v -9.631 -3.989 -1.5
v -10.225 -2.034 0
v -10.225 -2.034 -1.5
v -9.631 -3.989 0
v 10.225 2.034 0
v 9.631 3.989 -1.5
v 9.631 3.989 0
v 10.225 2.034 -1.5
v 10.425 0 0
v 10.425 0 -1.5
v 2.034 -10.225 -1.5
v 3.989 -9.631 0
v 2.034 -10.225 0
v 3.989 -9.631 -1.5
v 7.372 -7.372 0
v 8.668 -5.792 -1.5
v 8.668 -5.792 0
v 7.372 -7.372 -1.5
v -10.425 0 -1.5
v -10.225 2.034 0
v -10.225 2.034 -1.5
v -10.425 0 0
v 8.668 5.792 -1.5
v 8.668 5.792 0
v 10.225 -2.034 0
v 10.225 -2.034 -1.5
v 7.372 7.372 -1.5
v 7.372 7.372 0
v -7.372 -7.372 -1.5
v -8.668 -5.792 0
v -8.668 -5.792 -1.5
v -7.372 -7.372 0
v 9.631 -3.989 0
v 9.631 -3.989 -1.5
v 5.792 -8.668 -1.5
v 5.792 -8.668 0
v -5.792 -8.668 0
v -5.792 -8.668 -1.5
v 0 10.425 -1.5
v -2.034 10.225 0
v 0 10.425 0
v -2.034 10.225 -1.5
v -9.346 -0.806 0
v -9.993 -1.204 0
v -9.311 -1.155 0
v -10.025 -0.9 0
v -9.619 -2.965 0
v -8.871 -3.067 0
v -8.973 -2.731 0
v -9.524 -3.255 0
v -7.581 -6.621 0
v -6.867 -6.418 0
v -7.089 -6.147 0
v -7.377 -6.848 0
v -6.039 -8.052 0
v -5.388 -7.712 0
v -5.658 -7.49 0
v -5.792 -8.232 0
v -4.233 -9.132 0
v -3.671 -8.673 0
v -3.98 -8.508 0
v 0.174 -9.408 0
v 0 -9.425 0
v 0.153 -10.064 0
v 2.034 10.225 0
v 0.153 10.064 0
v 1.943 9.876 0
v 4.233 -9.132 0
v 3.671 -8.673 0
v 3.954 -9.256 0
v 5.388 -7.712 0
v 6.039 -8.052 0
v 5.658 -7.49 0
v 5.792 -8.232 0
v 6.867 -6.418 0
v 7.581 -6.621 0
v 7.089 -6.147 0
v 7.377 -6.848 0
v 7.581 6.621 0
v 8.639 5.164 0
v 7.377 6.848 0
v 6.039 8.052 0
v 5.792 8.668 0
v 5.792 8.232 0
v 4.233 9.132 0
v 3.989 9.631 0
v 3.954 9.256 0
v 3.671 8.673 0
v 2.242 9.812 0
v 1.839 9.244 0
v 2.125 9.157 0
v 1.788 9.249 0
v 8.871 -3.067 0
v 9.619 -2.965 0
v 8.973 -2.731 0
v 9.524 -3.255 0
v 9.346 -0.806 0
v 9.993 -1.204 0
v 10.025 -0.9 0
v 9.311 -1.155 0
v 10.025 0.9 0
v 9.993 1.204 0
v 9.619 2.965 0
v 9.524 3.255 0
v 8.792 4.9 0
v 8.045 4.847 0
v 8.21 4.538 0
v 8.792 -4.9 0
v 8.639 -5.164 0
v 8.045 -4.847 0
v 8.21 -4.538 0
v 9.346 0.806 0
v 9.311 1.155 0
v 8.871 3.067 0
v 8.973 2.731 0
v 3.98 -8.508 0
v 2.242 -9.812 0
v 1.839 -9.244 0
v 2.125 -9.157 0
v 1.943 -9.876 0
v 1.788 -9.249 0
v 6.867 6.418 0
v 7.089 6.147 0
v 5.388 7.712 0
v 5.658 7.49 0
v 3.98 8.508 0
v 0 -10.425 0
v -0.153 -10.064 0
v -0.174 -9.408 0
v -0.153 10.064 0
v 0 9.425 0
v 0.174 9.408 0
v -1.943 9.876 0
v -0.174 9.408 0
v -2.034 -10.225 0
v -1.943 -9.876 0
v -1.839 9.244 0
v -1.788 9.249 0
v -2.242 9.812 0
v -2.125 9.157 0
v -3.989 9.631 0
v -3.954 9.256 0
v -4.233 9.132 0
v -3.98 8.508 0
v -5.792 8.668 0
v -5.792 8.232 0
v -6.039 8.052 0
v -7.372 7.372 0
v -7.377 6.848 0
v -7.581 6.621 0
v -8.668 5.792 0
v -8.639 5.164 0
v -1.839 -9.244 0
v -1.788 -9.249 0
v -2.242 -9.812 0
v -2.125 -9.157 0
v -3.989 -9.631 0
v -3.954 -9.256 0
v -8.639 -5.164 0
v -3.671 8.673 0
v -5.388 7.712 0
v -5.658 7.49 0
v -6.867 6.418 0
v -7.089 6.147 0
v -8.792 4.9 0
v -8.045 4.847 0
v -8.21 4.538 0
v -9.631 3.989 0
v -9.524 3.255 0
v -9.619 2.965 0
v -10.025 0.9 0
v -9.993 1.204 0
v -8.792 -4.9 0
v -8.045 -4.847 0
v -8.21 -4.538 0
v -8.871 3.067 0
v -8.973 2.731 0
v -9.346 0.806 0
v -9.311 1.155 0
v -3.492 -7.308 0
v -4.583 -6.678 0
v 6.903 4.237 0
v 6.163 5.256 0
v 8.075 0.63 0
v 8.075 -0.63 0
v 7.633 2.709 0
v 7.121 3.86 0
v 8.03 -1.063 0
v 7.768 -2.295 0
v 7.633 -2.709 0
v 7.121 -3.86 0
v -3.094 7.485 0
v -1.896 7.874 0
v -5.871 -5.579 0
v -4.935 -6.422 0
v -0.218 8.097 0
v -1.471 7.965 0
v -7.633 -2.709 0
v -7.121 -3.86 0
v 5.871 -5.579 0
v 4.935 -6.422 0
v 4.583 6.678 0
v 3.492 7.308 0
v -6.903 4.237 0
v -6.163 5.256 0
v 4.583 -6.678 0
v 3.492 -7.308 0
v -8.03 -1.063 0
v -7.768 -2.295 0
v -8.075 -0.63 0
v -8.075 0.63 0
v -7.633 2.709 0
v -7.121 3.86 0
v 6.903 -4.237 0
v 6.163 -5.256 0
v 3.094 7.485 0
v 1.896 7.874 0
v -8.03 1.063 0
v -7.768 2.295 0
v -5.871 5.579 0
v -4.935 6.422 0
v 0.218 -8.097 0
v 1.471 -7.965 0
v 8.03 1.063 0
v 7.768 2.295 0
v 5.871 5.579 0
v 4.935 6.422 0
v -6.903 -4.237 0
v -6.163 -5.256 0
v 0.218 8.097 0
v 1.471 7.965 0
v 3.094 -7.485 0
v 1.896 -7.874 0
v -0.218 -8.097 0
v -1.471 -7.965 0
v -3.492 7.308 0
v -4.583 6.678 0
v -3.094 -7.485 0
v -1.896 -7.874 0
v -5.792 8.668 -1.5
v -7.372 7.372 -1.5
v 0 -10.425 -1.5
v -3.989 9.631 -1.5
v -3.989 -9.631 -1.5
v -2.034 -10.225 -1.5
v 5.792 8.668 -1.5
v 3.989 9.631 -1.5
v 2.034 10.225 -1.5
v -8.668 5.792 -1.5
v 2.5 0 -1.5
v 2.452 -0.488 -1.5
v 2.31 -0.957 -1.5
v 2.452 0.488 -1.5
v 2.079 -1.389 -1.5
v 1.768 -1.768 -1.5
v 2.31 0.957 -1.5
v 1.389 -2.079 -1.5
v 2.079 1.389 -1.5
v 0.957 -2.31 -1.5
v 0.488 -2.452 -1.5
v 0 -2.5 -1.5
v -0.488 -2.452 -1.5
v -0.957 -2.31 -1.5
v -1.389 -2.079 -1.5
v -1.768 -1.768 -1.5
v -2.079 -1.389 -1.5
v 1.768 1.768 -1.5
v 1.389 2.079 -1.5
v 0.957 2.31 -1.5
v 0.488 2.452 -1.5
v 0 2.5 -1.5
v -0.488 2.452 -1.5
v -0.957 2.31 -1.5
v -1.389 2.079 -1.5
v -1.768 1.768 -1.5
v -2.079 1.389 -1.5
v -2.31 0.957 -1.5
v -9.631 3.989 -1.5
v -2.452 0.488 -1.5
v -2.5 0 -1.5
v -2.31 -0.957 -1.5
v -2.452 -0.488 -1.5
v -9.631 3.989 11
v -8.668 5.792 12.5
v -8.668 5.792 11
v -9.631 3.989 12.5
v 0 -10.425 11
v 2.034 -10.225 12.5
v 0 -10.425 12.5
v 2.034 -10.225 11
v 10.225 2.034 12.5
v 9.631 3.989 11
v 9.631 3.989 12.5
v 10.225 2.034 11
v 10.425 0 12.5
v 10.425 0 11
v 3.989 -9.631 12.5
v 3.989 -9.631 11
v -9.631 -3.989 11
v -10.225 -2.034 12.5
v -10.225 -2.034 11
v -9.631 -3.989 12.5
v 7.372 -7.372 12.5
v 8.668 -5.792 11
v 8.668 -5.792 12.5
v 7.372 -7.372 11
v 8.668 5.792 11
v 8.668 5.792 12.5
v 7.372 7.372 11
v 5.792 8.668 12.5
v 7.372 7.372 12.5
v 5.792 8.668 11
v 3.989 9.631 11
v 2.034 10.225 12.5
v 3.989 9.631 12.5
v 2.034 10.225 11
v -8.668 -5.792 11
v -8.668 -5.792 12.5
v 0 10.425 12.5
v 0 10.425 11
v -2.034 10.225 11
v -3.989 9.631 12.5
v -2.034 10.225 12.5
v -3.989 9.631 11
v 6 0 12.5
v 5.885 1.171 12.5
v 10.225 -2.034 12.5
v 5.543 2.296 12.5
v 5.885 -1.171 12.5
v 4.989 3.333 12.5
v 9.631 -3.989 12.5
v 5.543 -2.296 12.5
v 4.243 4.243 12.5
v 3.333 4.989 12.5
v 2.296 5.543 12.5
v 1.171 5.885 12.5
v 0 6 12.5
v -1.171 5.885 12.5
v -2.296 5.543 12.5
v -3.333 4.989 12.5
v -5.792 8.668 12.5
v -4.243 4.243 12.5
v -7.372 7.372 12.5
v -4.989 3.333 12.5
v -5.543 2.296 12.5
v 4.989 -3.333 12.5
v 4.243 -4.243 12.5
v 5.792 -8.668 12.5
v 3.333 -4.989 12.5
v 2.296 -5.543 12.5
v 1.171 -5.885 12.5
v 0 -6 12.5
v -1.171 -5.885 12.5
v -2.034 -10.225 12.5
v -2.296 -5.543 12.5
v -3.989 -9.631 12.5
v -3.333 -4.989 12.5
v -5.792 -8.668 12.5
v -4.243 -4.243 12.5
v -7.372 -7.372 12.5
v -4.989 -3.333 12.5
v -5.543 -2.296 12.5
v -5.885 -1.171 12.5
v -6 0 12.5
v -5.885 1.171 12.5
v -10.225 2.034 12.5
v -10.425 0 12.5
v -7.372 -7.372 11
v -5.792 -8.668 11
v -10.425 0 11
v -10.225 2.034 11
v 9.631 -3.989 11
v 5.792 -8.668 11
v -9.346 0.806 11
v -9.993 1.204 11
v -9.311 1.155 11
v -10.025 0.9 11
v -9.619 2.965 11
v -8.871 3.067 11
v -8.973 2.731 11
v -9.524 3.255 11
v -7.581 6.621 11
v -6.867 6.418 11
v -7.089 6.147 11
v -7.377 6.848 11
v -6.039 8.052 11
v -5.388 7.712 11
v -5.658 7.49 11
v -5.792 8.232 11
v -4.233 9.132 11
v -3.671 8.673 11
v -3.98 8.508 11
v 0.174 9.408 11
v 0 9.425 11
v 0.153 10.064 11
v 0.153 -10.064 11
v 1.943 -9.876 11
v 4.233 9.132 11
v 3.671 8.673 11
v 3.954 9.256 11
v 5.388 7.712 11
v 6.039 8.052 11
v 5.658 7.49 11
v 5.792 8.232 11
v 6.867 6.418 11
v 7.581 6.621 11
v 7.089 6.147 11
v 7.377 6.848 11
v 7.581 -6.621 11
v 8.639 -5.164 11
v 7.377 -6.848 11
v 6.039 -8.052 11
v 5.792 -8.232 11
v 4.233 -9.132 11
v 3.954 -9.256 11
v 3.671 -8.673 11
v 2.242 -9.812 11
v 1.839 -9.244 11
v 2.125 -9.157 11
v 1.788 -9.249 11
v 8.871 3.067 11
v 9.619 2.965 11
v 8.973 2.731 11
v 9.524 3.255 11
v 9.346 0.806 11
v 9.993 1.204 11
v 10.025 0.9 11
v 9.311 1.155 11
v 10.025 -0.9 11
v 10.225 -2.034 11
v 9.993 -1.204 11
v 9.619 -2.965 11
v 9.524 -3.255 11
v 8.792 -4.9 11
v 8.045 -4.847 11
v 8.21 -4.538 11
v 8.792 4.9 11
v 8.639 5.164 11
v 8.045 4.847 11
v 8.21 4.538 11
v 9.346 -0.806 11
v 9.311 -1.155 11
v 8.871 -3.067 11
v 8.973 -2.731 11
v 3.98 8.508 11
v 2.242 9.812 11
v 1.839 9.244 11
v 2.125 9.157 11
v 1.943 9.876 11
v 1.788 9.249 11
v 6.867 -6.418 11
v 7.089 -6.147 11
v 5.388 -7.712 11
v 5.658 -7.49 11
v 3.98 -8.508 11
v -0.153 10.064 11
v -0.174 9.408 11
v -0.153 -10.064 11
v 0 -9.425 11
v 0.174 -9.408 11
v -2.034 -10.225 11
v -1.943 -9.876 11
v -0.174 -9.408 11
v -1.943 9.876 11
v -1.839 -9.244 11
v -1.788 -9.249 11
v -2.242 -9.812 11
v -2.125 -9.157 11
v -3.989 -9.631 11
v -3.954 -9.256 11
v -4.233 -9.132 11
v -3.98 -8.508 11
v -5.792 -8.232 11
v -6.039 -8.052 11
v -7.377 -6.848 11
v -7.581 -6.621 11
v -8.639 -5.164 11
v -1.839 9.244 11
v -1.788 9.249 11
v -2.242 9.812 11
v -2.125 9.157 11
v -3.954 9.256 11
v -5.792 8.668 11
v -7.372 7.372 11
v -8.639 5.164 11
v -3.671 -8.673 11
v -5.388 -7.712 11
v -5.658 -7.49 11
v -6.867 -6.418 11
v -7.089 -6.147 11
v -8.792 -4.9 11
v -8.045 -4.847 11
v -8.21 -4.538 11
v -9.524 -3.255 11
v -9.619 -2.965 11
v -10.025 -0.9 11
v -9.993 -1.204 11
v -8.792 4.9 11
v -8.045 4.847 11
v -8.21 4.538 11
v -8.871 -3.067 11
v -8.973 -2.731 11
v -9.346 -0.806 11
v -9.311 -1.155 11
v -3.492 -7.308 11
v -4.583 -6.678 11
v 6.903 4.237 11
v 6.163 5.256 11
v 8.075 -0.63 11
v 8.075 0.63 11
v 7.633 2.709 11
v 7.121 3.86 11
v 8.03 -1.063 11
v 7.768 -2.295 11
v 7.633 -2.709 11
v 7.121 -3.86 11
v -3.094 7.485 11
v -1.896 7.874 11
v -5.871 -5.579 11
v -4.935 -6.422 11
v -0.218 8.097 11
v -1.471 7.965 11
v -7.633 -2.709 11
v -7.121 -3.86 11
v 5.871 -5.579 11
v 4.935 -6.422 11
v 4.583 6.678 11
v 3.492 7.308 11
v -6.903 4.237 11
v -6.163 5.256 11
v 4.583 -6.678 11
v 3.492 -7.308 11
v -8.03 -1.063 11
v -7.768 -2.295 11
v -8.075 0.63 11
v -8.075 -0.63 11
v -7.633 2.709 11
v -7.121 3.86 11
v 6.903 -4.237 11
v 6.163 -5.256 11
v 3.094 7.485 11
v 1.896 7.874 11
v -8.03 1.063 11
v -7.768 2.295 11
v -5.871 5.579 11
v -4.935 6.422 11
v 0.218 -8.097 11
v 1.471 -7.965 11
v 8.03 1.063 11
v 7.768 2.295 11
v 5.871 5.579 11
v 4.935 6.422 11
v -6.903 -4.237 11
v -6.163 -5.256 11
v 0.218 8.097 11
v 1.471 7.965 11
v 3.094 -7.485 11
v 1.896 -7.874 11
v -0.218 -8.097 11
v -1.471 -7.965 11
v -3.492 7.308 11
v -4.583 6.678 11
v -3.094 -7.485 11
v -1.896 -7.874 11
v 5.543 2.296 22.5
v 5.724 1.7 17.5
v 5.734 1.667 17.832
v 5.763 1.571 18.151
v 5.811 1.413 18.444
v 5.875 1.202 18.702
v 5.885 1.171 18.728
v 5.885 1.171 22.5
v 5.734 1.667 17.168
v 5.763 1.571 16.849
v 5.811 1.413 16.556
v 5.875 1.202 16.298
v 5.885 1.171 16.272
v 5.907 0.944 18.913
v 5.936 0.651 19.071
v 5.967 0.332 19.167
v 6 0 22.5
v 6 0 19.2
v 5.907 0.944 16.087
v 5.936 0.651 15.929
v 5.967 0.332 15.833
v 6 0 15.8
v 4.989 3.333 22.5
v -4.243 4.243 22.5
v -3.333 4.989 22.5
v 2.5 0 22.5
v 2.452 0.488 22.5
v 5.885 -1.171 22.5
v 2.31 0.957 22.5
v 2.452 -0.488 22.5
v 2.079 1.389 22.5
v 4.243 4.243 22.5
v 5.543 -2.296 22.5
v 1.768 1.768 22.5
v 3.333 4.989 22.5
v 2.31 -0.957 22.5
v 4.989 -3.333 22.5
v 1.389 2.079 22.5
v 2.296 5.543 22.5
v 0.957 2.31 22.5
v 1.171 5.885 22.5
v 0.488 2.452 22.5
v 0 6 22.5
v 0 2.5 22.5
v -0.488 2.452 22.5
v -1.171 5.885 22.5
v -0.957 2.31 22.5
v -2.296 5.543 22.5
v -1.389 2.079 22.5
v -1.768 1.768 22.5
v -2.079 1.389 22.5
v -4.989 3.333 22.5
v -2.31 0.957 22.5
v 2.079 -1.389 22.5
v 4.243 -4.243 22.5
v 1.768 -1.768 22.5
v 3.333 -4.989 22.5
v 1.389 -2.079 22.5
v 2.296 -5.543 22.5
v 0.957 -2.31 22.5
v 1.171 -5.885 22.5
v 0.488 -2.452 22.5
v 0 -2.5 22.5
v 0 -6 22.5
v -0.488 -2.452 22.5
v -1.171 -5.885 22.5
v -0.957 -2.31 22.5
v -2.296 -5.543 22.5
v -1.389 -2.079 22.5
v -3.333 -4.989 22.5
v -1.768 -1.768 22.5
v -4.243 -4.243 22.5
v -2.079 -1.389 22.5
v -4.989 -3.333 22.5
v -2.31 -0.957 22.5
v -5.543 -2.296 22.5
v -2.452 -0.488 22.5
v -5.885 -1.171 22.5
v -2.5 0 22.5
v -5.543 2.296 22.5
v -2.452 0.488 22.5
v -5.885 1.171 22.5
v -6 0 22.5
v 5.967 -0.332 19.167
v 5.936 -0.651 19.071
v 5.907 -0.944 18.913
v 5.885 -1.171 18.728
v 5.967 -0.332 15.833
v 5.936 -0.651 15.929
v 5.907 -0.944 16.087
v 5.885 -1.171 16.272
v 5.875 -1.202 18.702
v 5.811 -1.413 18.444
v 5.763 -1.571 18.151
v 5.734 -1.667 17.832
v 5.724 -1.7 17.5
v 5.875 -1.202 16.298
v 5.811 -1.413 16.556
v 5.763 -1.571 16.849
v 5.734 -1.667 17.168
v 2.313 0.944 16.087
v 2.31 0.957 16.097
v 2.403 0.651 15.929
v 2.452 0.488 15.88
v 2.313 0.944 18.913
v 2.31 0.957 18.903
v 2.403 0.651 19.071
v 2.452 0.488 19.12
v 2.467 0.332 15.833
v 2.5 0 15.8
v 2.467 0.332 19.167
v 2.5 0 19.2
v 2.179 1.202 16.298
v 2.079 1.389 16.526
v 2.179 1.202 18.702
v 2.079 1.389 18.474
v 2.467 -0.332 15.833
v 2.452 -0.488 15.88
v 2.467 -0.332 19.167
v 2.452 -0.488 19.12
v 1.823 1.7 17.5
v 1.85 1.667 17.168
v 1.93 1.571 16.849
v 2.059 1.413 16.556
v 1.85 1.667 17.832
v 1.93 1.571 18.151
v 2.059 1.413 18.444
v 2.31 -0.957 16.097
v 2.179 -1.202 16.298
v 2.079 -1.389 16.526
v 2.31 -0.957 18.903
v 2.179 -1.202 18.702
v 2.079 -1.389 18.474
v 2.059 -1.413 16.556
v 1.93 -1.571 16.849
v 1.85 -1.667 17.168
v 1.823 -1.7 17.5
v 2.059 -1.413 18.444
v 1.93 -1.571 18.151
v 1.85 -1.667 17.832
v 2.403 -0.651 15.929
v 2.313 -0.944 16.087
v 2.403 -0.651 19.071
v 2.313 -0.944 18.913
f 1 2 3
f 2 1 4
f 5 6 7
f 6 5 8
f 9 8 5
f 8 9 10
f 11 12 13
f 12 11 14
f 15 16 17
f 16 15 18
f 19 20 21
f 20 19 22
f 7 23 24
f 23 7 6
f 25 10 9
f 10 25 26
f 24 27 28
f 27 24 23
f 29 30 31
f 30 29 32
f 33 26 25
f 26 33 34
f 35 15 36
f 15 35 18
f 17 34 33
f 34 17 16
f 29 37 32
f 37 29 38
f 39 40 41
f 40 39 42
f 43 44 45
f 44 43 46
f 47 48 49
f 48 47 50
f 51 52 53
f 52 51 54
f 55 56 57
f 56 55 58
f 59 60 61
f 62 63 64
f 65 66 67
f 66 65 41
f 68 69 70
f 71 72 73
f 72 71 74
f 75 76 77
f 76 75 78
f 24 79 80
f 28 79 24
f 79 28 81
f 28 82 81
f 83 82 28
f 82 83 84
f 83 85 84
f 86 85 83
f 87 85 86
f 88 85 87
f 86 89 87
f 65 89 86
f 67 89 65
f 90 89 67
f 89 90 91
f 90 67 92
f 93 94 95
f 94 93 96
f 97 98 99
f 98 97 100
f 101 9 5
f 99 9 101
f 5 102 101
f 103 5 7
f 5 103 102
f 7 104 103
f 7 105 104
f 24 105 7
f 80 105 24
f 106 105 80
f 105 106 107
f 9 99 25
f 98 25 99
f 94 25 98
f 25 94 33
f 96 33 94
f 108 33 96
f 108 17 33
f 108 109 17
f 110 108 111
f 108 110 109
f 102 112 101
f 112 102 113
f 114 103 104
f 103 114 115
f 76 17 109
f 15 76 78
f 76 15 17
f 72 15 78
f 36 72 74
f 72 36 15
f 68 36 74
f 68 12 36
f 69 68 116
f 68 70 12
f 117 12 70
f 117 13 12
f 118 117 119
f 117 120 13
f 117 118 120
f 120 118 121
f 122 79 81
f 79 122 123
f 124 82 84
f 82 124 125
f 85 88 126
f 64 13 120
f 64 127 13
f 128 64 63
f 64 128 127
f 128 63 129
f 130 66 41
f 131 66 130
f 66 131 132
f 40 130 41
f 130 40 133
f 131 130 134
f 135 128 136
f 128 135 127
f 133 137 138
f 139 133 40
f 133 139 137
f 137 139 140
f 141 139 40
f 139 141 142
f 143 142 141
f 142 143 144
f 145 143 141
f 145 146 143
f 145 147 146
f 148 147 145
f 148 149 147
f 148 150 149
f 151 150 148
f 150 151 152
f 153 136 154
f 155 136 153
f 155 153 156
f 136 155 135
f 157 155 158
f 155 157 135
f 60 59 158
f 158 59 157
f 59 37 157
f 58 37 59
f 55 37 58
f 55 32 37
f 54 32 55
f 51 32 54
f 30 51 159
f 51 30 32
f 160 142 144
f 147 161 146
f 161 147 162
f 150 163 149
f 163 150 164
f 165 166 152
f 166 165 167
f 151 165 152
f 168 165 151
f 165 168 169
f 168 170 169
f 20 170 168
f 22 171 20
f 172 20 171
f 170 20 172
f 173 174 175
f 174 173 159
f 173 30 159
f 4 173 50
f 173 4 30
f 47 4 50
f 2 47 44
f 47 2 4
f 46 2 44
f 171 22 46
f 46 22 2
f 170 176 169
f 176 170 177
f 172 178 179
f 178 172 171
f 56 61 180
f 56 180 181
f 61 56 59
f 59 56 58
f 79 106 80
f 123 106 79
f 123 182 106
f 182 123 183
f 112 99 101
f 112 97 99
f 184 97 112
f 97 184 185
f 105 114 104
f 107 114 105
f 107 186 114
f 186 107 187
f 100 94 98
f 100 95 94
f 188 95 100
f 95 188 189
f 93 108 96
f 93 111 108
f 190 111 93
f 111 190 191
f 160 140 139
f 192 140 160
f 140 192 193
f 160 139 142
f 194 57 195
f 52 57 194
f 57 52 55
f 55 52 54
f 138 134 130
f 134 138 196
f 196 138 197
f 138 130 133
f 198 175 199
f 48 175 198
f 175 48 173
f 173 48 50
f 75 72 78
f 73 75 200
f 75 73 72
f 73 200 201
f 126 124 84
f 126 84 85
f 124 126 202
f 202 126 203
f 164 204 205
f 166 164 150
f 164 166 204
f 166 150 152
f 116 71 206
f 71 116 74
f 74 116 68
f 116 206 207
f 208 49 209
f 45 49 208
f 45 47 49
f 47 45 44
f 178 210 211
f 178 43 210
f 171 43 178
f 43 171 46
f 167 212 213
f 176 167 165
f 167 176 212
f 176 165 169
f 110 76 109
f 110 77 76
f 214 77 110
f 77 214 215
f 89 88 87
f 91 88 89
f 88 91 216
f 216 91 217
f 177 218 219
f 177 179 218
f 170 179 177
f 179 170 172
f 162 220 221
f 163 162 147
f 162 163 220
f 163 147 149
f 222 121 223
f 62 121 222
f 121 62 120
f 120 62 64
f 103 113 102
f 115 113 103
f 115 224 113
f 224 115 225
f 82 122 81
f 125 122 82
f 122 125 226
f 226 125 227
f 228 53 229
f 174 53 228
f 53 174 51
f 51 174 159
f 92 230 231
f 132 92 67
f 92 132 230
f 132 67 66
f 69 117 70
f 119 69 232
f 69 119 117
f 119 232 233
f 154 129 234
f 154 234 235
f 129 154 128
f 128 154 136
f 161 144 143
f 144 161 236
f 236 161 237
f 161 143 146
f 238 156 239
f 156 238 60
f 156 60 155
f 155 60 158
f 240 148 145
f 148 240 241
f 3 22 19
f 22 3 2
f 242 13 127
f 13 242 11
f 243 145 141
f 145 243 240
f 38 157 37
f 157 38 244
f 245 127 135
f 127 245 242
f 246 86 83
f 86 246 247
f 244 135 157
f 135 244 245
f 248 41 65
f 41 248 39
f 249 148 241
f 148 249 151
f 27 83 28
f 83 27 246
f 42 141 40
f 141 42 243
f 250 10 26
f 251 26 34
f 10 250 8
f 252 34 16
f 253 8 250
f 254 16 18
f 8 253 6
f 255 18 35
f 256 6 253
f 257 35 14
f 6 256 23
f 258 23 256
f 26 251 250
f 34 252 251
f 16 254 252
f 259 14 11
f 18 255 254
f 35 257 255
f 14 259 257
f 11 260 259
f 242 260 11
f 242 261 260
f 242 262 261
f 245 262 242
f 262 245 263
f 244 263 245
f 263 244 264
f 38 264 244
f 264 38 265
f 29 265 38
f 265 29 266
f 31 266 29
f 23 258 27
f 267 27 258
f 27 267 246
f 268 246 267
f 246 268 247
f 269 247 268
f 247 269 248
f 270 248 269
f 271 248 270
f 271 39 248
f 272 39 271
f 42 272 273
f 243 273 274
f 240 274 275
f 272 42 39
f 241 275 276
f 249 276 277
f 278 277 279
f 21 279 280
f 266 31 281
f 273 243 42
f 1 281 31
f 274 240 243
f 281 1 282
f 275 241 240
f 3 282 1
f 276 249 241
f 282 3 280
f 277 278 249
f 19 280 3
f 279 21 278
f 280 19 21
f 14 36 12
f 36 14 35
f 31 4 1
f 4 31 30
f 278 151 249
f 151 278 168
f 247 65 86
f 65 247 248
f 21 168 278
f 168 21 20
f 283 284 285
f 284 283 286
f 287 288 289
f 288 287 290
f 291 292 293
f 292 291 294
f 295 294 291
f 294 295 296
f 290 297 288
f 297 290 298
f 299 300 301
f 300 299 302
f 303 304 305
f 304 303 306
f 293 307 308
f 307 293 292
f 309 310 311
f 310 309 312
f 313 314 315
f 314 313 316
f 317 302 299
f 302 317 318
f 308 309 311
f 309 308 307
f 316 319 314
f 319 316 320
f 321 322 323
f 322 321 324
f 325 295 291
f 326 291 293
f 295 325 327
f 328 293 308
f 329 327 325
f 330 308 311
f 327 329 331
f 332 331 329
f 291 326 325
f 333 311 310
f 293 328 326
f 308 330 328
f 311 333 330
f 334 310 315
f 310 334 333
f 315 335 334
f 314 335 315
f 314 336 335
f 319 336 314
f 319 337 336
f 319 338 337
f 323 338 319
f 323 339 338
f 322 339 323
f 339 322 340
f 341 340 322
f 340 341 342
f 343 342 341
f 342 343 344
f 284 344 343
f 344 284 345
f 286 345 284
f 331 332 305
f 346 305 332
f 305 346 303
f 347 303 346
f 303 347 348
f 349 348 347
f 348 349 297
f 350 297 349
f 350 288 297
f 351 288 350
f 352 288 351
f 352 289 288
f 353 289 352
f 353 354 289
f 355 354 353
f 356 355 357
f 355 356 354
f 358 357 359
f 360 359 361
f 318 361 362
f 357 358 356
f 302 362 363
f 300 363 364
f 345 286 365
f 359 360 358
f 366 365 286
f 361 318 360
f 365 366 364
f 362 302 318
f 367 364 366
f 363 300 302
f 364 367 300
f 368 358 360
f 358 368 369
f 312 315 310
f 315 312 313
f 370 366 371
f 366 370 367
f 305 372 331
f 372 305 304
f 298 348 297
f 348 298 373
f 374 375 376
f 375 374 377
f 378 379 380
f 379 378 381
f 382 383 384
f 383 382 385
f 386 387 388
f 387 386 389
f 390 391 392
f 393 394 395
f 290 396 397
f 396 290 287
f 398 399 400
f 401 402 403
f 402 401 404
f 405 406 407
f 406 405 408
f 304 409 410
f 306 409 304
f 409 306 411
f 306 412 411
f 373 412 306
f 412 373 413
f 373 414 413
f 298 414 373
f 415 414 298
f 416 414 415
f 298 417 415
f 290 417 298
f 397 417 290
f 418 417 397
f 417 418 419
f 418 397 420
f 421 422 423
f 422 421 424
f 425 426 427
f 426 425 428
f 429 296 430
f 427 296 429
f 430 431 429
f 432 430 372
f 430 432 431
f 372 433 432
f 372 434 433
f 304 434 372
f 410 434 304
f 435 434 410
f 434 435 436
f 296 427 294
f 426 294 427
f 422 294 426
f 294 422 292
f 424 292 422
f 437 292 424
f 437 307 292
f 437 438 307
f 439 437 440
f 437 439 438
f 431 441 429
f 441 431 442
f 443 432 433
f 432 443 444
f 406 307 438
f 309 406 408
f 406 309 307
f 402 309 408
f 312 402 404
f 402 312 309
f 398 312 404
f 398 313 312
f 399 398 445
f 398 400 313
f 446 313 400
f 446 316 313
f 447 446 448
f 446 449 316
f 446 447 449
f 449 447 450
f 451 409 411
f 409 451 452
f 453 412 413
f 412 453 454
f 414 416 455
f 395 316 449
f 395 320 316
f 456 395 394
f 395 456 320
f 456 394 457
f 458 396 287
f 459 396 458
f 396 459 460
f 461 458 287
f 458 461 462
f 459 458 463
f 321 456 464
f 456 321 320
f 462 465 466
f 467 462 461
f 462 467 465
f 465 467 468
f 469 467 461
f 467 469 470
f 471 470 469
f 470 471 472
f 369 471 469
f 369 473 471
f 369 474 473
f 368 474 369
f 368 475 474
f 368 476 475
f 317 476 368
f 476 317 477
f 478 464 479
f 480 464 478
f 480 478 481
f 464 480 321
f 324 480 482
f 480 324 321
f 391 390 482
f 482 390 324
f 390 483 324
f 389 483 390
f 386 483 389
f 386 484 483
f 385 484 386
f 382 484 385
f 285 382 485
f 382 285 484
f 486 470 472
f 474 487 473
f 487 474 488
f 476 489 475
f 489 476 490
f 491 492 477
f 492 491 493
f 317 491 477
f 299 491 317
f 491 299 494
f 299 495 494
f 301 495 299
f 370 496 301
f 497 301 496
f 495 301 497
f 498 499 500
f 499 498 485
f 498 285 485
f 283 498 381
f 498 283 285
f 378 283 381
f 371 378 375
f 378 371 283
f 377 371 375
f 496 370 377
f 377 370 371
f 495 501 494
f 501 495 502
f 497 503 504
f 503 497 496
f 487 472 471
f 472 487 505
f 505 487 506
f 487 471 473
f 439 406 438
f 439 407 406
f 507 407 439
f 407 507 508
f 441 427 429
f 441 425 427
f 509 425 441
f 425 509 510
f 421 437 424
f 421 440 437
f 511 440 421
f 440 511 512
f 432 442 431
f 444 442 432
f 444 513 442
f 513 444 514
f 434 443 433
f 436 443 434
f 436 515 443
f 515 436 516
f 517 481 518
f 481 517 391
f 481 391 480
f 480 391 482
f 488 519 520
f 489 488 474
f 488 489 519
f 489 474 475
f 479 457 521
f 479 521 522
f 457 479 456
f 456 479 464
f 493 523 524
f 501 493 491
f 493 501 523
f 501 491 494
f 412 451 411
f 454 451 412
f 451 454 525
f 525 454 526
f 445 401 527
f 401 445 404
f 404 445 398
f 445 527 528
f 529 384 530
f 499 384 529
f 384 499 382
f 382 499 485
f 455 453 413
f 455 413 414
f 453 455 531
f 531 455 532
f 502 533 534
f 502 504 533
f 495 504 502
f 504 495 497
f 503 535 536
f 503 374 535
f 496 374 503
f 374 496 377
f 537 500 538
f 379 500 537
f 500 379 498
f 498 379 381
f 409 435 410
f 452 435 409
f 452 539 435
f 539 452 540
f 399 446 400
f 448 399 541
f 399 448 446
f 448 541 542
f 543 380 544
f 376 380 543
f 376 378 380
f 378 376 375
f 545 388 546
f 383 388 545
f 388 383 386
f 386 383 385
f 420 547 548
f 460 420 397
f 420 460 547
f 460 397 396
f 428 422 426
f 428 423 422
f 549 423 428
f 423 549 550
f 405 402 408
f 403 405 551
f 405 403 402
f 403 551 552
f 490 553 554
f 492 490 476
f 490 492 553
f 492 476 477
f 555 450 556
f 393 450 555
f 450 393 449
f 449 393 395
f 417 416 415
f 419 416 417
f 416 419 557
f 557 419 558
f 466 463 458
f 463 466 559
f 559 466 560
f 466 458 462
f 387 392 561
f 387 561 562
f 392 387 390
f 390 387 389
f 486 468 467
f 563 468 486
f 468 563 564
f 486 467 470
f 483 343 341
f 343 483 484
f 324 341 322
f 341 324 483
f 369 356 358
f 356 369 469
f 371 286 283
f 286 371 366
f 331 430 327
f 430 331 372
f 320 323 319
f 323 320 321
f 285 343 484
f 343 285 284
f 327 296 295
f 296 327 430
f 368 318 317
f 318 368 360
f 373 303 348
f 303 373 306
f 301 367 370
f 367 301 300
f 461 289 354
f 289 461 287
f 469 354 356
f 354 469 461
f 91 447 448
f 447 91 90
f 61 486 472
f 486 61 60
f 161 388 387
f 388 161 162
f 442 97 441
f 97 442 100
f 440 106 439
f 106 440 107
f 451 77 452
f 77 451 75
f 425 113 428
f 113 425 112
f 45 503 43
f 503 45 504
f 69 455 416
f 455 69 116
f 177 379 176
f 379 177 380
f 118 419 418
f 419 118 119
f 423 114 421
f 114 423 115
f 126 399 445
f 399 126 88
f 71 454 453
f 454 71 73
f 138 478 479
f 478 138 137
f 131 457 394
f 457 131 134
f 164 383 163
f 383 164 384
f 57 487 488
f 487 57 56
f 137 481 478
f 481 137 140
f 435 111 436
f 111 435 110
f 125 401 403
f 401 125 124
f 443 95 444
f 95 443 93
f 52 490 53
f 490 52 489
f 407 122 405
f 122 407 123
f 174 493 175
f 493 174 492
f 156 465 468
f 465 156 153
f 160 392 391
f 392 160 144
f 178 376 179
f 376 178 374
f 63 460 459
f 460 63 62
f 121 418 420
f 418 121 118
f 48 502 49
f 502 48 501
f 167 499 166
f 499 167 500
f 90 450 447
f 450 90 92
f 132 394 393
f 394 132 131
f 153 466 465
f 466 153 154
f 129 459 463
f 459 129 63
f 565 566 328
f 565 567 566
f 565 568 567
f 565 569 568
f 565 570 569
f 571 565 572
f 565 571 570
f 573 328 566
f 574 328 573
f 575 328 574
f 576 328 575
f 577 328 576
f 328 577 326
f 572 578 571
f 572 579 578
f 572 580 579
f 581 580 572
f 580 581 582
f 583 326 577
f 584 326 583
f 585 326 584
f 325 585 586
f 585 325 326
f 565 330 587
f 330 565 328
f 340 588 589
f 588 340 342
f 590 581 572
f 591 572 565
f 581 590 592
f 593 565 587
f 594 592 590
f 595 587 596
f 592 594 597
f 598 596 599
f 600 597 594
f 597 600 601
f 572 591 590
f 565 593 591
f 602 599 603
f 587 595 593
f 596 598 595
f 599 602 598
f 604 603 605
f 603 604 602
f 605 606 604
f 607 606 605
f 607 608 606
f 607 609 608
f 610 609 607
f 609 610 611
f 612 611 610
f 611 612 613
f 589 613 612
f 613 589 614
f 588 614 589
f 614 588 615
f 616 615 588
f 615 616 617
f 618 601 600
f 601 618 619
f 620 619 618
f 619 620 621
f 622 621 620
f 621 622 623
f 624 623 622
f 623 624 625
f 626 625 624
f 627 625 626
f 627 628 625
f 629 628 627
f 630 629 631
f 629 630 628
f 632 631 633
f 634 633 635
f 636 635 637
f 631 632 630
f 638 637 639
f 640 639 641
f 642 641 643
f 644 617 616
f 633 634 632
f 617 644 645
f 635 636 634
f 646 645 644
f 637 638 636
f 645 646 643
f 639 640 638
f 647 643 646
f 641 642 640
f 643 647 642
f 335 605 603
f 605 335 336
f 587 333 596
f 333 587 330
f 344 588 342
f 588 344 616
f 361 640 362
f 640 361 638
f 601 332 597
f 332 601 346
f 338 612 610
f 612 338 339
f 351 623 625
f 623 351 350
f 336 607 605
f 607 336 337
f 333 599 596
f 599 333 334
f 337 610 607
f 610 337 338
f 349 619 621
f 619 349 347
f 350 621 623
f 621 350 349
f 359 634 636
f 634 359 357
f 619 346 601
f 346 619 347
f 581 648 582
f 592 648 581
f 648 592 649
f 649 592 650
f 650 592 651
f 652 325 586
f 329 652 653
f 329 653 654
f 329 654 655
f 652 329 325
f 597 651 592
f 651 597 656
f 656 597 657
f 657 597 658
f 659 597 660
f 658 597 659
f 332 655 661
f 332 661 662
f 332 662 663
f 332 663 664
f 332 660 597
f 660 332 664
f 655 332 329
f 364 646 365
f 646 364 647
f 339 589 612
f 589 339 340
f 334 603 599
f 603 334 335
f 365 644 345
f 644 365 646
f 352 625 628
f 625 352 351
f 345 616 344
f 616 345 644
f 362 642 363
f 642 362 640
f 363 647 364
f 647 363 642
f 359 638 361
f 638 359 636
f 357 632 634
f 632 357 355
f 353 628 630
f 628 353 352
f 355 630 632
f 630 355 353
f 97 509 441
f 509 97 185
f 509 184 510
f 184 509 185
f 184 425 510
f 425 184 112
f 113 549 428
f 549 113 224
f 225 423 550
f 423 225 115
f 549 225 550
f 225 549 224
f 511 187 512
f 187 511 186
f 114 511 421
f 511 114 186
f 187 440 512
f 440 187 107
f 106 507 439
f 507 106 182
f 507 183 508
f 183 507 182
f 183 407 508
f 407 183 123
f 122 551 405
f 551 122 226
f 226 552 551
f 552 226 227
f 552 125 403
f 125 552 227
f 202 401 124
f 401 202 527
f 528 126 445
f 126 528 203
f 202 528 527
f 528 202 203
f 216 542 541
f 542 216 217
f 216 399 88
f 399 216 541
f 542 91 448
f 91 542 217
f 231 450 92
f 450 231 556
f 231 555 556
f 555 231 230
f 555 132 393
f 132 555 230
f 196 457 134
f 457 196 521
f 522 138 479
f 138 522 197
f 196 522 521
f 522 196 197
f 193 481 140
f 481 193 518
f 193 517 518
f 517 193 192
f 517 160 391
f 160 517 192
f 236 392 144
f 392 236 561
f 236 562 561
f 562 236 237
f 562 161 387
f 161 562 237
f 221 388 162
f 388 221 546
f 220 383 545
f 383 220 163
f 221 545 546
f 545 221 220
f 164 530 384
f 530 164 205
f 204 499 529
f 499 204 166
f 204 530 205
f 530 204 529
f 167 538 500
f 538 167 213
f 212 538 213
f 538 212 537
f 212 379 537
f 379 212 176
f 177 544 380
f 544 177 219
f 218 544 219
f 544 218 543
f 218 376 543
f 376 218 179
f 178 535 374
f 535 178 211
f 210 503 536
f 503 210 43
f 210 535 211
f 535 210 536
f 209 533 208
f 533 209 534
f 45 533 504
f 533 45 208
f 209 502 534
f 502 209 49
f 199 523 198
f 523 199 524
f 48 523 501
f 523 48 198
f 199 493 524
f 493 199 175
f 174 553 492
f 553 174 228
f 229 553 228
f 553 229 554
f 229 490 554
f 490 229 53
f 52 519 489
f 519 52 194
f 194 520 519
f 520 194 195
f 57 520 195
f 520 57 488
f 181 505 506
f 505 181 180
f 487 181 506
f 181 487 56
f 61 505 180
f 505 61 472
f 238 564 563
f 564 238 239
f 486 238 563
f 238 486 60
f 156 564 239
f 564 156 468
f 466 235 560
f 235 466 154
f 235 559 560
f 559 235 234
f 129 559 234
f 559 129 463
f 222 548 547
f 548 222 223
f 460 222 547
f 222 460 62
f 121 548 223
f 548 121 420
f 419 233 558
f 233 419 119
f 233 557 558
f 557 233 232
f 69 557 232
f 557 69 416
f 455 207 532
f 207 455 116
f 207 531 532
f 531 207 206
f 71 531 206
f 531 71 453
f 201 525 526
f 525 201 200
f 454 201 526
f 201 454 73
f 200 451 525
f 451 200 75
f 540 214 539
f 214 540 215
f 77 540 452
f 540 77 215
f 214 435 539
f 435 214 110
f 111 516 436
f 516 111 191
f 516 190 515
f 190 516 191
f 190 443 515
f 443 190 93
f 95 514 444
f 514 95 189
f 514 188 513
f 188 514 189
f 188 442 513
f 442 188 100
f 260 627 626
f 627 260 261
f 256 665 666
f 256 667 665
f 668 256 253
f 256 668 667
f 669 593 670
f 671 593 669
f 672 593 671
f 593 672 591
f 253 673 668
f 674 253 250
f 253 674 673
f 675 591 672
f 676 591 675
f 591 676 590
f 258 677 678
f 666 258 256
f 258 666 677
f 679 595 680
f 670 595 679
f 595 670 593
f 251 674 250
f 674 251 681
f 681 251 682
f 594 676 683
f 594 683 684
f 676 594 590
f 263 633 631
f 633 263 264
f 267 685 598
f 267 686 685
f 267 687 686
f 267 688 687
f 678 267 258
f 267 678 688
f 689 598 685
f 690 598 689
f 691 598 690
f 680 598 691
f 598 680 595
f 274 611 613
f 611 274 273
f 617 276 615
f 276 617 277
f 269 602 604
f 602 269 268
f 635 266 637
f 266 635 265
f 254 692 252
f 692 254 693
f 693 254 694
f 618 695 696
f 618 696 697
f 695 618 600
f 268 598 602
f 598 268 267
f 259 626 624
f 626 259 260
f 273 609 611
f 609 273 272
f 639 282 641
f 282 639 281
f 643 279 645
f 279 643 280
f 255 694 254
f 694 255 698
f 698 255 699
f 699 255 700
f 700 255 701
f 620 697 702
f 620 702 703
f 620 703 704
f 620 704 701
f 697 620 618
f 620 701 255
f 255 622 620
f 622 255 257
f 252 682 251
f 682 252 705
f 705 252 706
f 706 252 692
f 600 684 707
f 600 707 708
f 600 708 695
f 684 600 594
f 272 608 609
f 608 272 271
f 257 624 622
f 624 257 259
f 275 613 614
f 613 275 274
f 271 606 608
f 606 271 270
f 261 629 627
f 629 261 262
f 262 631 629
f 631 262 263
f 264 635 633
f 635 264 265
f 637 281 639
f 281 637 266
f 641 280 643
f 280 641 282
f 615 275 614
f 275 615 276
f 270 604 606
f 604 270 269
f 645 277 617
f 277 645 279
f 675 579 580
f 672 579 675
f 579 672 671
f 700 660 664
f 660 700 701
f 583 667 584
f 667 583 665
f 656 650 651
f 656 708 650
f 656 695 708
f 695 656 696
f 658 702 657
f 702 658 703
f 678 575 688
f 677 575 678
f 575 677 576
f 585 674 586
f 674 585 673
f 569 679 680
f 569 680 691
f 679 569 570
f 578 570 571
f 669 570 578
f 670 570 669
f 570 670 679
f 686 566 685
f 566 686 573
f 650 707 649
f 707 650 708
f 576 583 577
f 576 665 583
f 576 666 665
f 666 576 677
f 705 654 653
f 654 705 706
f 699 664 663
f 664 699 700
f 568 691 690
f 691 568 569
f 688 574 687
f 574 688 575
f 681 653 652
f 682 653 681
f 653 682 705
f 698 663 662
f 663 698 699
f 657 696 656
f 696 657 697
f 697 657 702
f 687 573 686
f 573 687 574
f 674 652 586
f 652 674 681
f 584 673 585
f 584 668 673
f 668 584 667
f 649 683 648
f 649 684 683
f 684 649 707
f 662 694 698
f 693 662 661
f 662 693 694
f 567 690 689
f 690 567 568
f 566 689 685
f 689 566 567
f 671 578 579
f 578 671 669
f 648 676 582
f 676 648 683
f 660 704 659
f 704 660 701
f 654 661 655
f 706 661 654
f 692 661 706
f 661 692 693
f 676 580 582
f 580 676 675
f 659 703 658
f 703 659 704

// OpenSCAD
$fn = 32;

// ----------------------------------------------------------------------
// Timing pulley: GT2 30T, pitch 2 mm, 20.85 mm x 24 mm
// ----------------------------------------------------------------------

// --- parameters (mm) ---
pitch = 2;                // belt pitch
teeth = 30;               // number of grooves
belt_w = 11;              // belt width between the flanges
tip_d = 18.85;            // tip circle diameter
root_d = 17.35;           // groove bottom diameter
groove_h = 0.75;          // groove depth
tooth_w = 1.5;            // groove width at the tip circle
flange_d = 20.85;         // flange diameter
flange_t = 1.5;           // flange thickness
spigot_d = 15.75;         // flange spigot, sunk into the rim
spigot_h = 1.2;           // spigot depth into the rim
bore_d = 5;               // shaft bore
hub_d = 12;               // hub diameter
hub_h = 10;               // hub above the flange
bottom_z = -1.5;          // lowest point of the pulley
top_z = 22.5;             // highest point of the pulley
set_d = 3.4;              // set screw tap hole

module rim() {
  cylinder(h = belt_w, d = tip_d);
}

module groove_cutter() {
  /* belt tooth groove: deeper than wide, cut through the belt width */
  translate([root_d / 2, 0, 0])
    linear_extrude(height = belt_w)
      polygon(points = [[-0.6, -tooth_w * 0.42], [groove_h + 0.6, -tooth_w * 0.6],
                        [groove_h + 0.6, tooth_w * 0.6], [-0.6, tooth_w * 0.42]]);
}

module flanges() {
  translate([0, 0, -flange_t]) cylinder(h = flange_t, d = flange_d);
  translate([0, 0, belt_w]) cylinder(h = flange_t, d = flange_d);
  translate([0, 0, -spigot_h]) cylinder(h = spigot_h + 0.6, d = spigot_d);
  translate([0, 0, belt_w - 0.6]) cylinder(h = spigot_h + 0.6, d = spigot_d);
}

module hub() {
  translate([0, 0, bottom_z]) cylinder(h = top_z - bottom_z, d = hub_d);
}

difference() {
  union() {
    rim();
    hub();
    flanges();
  }
  for (i = [0 : teeth - 1]) rotate([0, 0, i * 360 / teeth]) groove_cutter();
  translate([0, 0, bottom_z - 1]) cylinder(h = top_z - bottom_z + 2, d = bore_d);
  translate([-1, 0, top_z - hub_h * 0.5]) rotate([0, 90, 0]) cylinder(h = hub_d / 2 + 3, d = set_d);
}
